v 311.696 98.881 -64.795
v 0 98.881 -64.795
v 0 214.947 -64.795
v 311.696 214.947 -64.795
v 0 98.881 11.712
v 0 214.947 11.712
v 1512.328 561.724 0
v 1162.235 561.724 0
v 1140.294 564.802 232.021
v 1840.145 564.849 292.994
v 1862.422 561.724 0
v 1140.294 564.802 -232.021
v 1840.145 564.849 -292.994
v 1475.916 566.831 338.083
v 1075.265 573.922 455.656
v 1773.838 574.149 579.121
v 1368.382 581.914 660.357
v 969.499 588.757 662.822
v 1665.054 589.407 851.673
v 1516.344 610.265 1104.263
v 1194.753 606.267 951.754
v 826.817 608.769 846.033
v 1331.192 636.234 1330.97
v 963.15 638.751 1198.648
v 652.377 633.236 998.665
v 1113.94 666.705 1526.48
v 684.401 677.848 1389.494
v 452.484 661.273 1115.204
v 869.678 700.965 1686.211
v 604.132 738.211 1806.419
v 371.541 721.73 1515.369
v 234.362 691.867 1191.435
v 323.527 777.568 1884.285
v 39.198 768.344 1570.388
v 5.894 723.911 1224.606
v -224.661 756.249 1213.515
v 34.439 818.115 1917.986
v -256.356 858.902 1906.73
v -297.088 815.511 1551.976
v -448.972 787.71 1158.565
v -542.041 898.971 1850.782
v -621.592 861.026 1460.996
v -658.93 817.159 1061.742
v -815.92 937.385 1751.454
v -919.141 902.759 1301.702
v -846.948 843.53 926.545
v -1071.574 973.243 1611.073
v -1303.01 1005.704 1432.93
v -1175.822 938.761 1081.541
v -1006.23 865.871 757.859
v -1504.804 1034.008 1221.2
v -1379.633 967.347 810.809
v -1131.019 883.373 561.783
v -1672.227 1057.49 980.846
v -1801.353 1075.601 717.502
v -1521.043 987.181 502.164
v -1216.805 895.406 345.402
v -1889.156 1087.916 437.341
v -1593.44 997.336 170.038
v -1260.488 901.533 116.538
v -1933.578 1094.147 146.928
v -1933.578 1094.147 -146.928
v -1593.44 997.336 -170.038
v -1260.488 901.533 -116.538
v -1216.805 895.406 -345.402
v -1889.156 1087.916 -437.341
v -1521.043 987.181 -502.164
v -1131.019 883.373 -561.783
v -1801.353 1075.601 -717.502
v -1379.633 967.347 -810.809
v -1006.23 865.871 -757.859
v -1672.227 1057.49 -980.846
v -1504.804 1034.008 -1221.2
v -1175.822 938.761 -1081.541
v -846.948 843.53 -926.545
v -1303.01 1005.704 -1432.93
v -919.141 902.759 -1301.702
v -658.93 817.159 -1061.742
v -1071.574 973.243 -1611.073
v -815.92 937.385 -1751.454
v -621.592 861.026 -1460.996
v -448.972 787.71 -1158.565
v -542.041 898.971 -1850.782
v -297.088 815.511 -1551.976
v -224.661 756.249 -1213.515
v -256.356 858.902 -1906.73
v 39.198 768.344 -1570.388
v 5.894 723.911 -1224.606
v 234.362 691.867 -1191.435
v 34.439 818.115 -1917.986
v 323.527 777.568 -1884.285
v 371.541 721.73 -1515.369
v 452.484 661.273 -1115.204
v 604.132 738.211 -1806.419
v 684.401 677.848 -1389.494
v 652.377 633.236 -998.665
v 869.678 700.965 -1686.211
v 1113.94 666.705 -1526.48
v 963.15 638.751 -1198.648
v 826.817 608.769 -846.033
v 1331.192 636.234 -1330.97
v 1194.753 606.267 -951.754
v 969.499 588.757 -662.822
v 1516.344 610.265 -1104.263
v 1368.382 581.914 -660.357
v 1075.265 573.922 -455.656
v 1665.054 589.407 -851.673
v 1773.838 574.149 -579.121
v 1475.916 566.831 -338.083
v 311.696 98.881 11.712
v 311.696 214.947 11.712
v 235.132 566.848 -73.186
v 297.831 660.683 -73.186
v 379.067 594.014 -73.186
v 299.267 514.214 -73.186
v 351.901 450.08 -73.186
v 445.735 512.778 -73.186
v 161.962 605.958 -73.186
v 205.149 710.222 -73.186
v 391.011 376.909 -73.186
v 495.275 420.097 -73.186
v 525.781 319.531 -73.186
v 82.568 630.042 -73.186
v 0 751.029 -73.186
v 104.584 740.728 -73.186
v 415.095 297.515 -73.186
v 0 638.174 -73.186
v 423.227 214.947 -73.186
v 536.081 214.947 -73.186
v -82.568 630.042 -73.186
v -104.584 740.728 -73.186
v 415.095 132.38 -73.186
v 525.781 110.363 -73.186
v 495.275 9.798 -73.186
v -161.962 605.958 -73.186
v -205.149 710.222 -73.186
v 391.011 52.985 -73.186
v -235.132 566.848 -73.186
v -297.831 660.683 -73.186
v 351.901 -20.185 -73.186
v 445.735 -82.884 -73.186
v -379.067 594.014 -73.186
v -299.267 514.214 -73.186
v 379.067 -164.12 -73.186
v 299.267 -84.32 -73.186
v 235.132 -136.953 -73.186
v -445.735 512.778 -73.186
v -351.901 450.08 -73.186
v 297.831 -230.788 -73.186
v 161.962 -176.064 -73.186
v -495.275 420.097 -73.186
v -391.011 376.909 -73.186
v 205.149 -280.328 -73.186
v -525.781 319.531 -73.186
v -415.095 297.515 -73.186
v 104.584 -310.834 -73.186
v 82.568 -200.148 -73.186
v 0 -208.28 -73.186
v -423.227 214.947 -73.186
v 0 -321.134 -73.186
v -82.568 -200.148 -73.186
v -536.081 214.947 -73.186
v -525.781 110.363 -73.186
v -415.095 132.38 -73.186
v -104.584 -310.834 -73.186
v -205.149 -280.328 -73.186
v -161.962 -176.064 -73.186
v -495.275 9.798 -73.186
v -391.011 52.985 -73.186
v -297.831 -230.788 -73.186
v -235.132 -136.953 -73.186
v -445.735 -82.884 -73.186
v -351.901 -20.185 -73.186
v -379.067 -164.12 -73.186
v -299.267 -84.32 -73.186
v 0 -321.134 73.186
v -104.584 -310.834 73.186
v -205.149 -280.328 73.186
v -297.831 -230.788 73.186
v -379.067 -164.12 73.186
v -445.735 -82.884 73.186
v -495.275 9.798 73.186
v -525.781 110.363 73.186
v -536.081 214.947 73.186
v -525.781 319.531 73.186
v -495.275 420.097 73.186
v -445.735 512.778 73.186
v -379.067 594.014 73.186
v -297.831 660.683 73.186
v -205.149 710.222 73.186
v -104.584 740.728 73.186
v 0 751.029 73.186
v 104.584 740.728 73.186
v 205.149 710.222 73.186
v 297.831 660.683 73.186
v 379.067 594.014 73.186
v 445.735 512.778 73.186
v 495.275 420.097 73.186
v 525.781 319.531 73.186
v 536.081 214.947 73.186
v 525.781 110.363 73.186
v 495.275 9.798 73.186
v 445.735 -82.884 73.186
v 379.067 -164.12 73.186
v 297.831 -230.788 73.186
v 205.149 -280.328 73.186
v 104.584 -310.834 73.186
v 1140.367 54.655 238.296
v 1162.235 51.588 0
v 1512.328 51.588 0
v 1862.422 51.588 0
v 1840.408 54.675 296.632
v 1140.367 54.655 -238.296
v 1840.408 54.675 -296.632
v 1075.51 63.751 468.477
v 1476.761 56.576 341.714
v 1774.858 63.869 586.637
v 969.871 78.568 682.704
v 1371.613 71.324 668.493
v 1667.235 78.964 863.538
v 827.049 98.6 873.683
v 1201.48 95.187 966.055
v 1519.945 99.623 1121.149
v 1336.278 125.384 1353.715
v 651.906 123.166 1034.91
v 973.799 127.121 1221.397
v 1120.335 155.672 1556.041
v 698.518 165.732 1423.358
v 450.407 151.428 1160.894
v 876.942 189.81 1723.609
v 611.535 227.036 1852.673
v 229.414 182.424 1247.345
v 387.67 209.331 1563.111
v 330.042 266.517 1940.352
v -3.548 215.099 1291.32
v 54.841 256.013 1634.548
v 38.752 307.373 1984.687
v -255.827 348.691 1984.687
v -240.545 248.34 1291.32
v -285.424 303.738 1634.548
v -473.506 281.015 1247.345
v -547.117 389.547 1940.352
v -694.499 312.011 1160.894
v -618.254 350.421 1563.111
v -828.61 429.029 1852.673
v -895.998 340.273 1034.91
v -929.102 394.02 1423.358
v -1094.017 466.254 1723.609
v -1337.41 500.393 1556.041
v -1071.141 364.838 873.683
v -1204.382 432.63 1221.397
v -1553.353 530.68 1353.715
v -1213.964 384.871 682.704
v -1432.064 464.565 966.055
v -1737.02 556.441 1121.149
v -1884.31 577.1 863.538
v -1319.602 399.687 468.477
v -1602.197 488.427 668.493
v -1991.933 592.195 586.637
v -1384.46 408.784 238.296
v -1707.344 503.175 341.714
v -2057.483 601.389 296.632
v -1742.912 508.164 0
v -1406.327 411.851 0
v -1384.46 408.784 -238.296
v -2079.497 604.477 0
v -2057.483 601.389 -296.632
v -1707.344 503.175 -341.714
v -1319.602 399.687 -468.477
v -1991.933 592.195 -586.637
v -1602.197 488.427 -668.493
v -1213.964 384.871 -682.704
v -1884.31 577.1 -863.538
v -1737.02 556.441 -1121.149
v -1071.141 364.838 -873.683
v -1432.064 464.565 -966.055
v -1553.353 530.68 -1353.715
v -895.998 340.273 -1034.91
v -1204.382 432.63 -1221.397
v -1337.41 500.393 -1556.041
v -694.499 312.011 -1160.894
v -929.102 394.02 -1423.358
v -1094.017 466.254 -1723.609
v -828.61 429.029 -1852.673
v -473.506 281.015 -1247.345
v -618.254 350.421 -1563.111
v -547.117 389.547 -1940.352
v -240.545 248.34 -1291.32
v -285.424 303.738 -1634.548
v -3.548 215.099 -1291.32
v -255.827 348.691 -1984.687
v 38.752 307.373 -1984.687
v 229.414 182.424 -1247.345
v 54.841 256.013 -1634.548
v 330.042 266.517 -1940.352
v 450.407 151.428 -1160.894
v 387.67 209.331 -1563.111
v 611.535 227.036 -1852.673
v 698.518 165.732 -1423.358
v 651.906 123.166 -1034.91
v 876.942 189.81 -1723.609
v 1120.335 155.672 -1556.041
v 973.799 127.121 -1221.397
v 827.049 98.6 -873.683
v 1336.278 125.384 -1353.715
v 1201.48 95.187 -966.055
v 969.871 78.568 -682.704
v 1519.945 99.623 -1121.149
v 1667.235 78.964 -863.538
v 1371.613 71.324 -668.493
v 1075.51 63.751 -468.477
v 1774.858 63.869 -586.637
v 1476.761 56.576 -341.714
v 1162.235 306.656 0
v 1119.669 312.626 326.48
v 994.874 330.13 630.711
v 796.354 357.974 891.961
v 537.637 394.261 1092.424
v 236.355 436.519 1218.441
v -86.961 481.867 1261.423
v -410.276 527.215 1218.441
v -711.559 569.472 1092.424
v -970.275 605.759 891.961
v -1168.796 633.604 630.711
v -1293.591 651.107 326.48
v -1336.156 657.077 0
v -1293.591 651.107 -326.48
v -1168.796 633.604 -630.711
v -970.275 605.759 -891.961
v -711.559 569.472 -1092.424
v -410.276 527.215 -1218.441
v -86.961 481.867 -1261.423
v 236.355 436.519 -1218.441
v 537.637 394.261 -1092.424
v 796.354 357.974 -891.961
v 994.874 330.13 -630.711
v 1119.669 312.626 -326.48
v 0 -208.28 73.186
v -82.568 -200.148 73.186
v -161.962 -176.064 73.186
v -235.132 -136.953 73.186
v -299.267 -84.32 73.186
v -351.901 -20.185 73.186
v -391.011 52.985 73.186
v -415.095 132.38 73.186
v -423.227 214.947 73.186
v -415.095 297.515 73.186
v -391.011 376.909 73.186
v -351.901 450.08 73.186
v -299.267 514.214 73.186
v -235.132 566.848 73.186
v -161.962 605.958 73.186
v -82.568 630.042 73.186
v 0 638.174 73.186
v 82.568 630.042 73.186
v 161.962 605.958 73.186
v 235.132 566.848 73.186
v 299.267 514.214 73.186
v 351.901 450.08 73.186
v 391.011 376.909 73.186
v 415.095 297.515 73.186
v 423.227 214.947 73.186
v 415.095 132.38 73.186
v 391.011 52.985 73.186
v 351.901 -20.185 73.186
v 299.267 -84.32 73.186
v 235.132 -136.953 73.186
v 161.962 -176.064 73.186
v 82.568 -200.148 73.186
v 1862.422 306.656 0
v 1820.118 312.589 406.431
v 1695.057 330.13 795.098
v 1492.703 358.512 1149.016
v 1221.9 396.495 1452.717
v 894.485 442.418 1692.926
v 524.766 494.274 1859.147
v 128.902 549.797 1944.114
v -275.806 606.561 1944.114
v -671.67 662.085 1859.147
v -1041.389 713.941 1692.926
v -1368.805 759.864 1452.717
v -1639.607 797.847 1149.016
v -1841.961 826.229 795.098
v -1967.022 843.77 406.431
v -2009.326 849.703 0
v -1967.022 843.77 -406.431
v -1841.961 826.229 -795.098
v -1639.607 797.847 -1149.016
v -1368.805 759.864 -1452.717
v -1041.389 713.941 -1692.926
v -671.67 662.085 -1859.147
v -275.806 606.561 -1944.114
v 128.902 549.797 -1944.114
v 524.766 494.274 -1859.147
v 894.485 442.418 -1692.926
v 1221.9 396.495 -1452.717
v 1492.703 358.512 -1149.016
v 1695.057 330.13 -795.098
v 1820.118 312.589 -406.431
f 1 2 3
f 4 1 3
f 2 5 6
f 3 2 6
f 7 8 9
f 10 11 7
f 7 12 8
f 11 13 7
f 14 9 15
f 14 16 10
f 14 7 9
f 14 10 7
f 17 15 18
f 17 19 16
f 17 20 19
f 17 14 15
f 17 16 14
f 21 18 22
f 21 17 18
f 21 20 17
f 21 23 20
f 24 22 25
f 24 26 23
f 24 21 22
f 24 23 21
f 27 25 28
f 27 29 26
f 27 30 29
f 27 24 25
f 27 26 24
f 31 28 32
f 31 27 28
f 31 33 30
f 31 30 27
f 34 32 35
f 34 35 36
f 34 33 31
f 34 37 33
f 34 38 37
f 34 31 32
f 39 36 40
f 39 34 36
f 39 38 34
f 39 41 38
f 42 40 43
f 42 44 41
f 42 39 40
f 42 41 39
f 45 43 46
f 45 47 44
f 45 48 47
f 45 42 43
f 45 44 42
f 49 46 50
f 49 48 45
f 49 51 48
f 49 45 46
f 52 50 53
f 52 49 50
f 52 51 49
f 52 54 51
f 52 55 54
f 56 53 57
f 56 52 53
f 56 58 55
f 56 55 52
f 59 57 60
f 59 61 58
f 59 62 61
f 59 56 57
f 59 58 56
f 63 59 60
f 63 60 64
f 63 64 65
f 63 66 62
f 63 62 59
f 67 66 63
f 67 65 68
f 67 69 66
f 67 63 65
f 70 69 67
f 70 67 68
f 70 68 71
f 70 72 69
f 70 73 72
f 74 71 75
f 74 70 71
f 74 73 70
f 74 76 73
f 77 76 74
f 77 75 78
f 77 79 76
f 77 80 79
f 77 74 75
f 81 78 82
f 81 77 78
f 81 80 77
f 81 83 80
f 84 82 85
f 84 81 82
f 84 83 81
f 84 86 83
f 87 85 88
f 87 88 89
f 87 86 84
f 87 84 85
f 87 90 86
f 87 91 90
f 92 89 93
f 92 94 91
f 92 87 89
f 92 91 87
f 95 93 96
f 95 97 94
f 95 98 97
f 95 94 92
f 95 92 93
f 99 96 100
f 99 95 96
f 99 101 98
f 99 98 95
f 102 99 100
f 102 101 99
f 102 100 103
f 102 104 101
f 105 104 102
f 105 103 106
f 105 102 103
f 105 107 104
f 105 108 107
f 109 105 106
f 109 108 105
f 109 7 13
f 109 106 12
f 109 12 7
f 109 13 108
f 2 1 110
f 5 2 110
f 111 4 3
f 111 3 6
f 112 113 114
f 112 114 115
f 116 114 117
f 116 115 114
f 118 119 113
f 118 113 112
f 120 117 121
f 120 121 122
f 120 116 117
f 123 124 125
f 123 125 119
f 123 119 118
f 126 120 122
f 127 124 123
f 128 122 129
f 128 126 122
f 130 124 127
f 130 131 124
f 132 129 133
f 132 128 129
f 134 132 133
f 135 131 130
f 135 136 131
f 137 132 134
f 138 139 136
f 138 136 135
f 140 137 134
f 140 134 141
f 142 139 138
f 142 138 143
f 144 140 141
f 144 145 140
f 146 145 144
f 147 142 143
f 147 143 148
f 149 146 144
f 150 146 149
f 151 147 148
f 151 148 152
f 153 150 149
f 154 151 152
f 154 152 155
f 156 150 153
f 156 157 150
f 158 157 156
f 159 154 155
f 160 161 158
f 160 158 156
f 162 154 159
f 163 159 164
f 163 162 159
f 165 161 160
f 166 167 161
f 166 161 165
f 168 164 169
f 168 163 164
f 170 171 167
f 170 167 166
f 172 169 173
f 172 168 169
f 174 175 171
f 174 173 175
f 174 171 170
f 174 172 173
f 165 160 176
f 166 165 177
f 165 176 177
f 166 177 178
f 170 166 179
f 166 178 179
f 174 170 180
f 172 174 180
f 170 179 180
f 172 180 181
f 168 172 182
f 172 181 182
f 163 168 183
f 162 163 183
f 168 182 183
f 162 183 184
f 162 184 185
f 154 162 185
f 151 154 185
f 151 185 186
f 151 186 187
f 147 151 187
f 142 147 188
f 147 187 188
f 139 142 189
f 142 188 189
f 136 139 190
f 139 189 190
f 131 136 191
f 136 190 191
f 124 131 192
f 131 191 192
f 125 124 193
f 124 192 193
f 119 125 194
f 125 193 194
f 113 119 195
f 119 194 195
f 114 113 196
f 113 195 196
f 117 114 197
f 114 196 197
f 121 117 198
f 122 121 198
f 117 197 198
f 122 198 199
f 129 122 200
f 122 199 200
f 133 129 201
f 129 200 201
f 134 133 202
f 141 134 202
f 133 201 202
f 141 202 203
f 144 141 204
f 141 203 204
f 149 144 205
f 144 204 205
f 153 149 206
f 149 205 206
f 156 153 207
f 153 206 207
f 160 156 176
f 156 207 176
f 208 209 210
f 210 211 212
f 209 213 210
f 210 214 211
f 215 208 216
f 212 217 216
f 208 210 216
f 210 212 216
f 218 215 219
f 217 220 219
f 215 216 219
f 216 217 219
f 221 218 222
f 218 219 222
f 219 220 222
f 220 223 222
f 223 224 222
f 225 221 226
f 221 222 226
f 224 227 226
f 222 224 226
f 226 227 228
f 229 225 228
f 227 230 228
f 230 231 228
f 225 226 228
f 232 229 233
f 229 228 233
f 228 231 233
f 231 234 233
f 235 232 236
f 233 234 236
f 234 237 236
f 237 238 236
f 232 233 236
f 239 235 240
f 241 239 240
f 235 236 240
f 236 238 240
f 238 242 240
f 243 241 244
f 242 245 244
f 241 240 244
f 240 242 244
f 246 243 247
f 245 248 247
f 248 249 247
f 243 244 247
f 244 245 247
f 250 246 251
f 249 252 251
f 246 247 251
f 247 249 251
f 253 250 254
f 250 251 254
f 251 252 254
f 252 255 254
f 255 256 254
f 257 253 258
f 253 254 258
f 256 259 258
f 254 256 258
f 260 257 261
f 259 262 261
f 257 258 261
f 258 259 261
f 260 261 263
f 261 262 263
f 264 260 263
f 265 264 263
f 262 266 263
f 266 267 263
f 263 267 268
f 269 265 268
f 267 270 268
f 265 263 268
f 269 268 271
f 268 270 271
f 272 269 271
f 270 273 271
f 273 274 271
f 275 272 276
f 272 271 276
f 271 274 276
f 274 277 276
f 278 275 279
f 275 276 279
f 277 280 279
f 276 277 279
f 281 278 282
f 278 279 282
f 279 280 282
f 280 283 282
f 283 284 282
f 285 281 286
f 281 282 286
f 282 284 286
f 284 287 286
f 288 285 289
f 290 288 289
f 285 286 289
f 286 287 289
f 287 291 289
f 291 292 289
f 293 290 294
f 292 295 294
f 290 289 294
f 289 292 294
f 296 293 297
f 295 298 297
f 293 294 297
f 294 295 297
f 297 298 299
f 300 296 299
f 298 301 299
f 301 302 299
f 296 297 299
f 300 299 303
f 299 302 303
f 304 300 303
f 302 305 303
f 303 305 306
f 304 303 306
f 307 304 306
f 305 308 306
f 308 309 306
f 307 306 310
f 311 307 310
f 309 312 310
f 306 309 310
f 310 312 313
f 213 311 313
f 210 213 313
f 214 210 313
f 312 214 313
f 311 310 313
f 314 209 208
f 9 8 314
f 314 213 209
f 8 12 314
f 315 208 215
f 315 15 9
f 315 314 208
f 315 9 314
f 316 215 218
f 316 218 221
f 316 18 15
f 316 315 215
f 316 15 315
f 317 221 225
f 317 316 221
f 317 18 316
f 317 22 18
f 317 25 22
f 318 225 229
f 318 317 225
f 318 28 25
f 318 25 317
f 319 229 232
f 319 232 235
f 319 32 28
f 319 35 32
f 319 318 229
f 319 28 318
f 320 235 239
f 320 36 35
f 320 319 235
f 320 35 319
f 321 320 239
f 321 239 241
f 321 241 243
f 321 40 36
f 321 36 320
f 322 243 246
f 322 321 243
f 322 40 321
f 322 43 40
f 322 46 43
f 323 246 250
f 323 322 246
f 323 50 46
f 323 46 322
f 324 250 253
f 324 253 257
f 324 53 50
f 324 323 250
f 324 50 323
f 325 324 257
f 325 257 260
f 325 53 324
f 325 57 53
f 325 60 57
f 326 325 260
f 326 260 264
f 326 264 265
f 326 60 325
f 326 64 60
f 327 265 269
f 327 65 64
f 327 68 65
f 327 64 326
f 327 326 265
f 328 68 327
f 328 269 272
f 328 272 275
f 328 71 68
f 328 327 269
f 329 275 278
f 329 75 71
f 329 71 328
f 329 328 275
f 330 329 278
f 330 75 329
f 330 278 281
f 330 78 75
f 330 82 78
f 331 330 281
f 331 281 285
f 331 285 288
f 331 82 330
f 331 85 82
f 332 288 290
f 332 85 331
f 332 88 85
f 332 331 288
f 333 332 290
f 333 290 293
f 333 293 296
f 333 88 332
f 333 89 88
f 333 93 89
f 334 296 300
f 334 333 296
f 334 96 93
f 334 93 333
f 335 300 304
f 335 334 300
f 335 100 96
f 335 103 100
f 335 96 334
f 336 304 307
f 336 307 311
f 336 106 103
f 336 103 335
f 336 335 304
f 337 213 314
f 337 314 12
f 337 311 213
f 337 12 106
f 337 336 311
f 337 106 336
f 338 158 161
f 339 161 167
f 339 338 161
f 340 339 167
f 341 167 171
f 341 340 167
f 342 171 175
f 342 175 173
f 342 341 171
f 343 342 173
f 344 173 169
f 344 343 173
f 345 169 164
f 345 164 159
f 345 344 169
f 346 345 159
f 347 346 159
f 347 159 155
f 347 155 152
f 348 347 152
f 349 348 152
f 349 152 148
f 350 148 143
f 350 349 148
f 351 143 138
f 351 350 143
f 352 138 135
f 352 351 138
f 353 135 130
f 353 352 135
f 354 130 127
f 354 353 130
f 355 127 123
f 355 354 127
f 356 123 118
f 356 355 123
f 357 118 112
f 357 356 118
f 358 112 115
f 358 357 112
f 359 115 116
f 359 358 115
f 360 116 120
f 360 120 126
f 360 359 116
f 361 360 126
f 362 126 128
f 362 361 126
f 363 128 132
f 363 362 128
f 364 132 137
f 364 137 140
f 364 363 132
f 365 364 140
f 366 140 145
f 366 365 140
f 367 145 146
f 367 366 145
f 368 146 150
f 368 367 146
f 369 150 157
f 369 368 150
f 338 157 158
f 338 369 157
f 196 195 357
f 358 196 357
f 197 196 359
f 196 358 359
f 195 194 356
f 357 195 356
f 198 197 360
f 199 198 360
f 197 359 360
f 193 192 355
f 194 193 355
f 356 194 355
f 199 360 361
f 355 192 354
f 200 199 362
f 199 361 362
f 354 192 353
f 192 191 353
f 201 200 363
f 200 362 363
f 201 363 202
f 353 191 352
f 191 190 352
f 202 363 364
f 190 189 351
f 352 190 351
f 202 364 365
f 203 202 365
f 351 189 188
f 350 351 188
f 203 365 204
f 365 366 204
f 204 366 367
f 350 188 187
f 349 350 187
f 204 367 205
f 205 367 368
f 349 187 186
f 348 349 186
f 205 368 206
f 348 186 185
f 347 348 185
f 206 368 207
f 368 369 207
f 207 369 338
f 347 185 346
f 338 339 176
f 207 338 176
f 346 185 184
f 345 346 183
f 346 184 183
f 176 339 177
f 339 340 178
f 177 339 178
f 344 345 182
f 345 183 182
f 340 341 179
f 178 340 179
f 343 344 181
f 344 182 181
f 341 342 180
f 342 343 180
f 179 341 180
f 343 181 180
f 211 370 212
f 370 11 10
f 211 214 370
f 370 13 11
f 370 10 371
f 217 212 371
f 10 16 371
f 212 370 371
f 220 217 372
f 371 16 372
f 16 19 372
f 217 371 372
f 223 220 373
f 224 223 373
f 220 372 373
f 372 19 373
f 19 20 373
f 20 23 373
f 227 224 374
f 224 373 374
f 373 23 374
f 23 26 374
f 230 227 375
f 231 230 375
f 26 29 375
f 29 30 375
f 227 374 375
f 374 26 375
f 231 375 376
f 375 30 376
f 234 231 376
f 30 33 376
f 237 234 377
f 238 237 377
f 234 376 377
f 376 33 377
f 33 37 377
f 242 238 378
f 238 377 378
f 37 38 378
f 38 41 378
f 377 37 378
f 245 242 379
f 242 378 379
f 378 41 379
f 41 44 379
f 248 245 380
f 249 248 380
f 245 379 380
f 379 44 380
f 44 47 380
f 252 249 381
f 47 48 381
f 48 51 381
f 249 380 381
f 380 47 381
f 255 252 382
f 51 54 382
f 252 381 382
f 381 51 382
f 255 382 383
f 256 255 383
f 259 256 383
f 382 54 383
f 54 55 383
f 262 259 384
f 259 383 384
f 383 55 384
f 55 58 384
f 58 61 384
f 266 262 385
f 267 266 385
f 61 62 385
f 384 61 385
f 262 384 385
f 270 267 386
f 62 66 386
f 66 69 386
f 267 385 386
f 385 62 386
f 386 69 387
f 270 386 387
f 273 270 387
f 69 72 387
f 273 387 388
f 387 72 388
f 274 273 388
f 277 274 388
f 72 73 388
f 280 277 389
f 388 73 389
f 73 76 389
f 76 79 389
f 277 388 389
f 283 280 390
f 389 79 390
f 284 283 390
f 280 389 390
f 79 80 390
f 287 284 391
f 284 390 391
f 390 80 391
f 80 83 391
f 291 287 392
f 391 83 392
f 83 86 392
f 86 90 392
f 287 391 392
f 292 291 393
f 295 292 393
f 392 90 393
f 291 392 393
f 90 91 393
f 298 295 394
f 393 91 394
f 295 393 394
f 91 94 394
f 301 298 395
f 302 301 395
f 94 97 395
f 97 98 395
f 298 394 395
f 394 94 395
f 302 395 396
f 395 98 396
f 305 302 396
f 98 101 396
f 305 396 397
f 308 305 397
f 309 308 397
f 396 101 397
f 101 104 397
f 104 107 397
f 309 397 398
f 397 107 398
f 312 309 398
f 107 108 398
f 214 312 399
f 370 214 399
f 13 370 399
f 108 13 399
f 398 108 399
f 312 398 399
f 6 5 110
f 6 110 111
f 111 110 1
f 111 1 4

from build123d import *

# Parameters (mm, degrees)
F0_W     = 116.0661578178
F0_H     = 76.507166028
F2_DEPTH = 311.695529148
F3_W     = 112.8542423248
F3_H     = 146.3711559772
F5_W     = 700.1872062683
F5_H     = 510.1366043091


with BuildPart() as f2:
    # F0 (on Right) → F2 (new body)
    with BuildSketch(Plane.YZ):
        with Locations((156.9139957428, -26.5412181616)):
            Rectangle(F0_W, F0_H)
    extrude(amount=F2_DEPTH)


with BuildPart() as f4:
    # F3 (on Right) → F4 (revolve)
    with BuildSketch(Plane.YZ):
        with Locations((-264.7072672844, 0)):
            Rectangle(F3_W, F3_H)
    revolve(axis=Axis((0, 214.9470746517, -26.5412181616), (0, 0, -1)))


with BuildPart() as f6:
    # F5 (on Top) → F6 (revolve)
    with BuildSketch(Plane.XY):
        with Locations((1512.3281478882, 306.6558837891)):
            Rectangle(F5_W, F5_H)
    revolve(axis=Axis((-124.8612999916, 211.6487026215, 0), (-0.1388993005, -0.9903065103, 0)))


solid = Compound([f2.part, f4.part, f6.part])
